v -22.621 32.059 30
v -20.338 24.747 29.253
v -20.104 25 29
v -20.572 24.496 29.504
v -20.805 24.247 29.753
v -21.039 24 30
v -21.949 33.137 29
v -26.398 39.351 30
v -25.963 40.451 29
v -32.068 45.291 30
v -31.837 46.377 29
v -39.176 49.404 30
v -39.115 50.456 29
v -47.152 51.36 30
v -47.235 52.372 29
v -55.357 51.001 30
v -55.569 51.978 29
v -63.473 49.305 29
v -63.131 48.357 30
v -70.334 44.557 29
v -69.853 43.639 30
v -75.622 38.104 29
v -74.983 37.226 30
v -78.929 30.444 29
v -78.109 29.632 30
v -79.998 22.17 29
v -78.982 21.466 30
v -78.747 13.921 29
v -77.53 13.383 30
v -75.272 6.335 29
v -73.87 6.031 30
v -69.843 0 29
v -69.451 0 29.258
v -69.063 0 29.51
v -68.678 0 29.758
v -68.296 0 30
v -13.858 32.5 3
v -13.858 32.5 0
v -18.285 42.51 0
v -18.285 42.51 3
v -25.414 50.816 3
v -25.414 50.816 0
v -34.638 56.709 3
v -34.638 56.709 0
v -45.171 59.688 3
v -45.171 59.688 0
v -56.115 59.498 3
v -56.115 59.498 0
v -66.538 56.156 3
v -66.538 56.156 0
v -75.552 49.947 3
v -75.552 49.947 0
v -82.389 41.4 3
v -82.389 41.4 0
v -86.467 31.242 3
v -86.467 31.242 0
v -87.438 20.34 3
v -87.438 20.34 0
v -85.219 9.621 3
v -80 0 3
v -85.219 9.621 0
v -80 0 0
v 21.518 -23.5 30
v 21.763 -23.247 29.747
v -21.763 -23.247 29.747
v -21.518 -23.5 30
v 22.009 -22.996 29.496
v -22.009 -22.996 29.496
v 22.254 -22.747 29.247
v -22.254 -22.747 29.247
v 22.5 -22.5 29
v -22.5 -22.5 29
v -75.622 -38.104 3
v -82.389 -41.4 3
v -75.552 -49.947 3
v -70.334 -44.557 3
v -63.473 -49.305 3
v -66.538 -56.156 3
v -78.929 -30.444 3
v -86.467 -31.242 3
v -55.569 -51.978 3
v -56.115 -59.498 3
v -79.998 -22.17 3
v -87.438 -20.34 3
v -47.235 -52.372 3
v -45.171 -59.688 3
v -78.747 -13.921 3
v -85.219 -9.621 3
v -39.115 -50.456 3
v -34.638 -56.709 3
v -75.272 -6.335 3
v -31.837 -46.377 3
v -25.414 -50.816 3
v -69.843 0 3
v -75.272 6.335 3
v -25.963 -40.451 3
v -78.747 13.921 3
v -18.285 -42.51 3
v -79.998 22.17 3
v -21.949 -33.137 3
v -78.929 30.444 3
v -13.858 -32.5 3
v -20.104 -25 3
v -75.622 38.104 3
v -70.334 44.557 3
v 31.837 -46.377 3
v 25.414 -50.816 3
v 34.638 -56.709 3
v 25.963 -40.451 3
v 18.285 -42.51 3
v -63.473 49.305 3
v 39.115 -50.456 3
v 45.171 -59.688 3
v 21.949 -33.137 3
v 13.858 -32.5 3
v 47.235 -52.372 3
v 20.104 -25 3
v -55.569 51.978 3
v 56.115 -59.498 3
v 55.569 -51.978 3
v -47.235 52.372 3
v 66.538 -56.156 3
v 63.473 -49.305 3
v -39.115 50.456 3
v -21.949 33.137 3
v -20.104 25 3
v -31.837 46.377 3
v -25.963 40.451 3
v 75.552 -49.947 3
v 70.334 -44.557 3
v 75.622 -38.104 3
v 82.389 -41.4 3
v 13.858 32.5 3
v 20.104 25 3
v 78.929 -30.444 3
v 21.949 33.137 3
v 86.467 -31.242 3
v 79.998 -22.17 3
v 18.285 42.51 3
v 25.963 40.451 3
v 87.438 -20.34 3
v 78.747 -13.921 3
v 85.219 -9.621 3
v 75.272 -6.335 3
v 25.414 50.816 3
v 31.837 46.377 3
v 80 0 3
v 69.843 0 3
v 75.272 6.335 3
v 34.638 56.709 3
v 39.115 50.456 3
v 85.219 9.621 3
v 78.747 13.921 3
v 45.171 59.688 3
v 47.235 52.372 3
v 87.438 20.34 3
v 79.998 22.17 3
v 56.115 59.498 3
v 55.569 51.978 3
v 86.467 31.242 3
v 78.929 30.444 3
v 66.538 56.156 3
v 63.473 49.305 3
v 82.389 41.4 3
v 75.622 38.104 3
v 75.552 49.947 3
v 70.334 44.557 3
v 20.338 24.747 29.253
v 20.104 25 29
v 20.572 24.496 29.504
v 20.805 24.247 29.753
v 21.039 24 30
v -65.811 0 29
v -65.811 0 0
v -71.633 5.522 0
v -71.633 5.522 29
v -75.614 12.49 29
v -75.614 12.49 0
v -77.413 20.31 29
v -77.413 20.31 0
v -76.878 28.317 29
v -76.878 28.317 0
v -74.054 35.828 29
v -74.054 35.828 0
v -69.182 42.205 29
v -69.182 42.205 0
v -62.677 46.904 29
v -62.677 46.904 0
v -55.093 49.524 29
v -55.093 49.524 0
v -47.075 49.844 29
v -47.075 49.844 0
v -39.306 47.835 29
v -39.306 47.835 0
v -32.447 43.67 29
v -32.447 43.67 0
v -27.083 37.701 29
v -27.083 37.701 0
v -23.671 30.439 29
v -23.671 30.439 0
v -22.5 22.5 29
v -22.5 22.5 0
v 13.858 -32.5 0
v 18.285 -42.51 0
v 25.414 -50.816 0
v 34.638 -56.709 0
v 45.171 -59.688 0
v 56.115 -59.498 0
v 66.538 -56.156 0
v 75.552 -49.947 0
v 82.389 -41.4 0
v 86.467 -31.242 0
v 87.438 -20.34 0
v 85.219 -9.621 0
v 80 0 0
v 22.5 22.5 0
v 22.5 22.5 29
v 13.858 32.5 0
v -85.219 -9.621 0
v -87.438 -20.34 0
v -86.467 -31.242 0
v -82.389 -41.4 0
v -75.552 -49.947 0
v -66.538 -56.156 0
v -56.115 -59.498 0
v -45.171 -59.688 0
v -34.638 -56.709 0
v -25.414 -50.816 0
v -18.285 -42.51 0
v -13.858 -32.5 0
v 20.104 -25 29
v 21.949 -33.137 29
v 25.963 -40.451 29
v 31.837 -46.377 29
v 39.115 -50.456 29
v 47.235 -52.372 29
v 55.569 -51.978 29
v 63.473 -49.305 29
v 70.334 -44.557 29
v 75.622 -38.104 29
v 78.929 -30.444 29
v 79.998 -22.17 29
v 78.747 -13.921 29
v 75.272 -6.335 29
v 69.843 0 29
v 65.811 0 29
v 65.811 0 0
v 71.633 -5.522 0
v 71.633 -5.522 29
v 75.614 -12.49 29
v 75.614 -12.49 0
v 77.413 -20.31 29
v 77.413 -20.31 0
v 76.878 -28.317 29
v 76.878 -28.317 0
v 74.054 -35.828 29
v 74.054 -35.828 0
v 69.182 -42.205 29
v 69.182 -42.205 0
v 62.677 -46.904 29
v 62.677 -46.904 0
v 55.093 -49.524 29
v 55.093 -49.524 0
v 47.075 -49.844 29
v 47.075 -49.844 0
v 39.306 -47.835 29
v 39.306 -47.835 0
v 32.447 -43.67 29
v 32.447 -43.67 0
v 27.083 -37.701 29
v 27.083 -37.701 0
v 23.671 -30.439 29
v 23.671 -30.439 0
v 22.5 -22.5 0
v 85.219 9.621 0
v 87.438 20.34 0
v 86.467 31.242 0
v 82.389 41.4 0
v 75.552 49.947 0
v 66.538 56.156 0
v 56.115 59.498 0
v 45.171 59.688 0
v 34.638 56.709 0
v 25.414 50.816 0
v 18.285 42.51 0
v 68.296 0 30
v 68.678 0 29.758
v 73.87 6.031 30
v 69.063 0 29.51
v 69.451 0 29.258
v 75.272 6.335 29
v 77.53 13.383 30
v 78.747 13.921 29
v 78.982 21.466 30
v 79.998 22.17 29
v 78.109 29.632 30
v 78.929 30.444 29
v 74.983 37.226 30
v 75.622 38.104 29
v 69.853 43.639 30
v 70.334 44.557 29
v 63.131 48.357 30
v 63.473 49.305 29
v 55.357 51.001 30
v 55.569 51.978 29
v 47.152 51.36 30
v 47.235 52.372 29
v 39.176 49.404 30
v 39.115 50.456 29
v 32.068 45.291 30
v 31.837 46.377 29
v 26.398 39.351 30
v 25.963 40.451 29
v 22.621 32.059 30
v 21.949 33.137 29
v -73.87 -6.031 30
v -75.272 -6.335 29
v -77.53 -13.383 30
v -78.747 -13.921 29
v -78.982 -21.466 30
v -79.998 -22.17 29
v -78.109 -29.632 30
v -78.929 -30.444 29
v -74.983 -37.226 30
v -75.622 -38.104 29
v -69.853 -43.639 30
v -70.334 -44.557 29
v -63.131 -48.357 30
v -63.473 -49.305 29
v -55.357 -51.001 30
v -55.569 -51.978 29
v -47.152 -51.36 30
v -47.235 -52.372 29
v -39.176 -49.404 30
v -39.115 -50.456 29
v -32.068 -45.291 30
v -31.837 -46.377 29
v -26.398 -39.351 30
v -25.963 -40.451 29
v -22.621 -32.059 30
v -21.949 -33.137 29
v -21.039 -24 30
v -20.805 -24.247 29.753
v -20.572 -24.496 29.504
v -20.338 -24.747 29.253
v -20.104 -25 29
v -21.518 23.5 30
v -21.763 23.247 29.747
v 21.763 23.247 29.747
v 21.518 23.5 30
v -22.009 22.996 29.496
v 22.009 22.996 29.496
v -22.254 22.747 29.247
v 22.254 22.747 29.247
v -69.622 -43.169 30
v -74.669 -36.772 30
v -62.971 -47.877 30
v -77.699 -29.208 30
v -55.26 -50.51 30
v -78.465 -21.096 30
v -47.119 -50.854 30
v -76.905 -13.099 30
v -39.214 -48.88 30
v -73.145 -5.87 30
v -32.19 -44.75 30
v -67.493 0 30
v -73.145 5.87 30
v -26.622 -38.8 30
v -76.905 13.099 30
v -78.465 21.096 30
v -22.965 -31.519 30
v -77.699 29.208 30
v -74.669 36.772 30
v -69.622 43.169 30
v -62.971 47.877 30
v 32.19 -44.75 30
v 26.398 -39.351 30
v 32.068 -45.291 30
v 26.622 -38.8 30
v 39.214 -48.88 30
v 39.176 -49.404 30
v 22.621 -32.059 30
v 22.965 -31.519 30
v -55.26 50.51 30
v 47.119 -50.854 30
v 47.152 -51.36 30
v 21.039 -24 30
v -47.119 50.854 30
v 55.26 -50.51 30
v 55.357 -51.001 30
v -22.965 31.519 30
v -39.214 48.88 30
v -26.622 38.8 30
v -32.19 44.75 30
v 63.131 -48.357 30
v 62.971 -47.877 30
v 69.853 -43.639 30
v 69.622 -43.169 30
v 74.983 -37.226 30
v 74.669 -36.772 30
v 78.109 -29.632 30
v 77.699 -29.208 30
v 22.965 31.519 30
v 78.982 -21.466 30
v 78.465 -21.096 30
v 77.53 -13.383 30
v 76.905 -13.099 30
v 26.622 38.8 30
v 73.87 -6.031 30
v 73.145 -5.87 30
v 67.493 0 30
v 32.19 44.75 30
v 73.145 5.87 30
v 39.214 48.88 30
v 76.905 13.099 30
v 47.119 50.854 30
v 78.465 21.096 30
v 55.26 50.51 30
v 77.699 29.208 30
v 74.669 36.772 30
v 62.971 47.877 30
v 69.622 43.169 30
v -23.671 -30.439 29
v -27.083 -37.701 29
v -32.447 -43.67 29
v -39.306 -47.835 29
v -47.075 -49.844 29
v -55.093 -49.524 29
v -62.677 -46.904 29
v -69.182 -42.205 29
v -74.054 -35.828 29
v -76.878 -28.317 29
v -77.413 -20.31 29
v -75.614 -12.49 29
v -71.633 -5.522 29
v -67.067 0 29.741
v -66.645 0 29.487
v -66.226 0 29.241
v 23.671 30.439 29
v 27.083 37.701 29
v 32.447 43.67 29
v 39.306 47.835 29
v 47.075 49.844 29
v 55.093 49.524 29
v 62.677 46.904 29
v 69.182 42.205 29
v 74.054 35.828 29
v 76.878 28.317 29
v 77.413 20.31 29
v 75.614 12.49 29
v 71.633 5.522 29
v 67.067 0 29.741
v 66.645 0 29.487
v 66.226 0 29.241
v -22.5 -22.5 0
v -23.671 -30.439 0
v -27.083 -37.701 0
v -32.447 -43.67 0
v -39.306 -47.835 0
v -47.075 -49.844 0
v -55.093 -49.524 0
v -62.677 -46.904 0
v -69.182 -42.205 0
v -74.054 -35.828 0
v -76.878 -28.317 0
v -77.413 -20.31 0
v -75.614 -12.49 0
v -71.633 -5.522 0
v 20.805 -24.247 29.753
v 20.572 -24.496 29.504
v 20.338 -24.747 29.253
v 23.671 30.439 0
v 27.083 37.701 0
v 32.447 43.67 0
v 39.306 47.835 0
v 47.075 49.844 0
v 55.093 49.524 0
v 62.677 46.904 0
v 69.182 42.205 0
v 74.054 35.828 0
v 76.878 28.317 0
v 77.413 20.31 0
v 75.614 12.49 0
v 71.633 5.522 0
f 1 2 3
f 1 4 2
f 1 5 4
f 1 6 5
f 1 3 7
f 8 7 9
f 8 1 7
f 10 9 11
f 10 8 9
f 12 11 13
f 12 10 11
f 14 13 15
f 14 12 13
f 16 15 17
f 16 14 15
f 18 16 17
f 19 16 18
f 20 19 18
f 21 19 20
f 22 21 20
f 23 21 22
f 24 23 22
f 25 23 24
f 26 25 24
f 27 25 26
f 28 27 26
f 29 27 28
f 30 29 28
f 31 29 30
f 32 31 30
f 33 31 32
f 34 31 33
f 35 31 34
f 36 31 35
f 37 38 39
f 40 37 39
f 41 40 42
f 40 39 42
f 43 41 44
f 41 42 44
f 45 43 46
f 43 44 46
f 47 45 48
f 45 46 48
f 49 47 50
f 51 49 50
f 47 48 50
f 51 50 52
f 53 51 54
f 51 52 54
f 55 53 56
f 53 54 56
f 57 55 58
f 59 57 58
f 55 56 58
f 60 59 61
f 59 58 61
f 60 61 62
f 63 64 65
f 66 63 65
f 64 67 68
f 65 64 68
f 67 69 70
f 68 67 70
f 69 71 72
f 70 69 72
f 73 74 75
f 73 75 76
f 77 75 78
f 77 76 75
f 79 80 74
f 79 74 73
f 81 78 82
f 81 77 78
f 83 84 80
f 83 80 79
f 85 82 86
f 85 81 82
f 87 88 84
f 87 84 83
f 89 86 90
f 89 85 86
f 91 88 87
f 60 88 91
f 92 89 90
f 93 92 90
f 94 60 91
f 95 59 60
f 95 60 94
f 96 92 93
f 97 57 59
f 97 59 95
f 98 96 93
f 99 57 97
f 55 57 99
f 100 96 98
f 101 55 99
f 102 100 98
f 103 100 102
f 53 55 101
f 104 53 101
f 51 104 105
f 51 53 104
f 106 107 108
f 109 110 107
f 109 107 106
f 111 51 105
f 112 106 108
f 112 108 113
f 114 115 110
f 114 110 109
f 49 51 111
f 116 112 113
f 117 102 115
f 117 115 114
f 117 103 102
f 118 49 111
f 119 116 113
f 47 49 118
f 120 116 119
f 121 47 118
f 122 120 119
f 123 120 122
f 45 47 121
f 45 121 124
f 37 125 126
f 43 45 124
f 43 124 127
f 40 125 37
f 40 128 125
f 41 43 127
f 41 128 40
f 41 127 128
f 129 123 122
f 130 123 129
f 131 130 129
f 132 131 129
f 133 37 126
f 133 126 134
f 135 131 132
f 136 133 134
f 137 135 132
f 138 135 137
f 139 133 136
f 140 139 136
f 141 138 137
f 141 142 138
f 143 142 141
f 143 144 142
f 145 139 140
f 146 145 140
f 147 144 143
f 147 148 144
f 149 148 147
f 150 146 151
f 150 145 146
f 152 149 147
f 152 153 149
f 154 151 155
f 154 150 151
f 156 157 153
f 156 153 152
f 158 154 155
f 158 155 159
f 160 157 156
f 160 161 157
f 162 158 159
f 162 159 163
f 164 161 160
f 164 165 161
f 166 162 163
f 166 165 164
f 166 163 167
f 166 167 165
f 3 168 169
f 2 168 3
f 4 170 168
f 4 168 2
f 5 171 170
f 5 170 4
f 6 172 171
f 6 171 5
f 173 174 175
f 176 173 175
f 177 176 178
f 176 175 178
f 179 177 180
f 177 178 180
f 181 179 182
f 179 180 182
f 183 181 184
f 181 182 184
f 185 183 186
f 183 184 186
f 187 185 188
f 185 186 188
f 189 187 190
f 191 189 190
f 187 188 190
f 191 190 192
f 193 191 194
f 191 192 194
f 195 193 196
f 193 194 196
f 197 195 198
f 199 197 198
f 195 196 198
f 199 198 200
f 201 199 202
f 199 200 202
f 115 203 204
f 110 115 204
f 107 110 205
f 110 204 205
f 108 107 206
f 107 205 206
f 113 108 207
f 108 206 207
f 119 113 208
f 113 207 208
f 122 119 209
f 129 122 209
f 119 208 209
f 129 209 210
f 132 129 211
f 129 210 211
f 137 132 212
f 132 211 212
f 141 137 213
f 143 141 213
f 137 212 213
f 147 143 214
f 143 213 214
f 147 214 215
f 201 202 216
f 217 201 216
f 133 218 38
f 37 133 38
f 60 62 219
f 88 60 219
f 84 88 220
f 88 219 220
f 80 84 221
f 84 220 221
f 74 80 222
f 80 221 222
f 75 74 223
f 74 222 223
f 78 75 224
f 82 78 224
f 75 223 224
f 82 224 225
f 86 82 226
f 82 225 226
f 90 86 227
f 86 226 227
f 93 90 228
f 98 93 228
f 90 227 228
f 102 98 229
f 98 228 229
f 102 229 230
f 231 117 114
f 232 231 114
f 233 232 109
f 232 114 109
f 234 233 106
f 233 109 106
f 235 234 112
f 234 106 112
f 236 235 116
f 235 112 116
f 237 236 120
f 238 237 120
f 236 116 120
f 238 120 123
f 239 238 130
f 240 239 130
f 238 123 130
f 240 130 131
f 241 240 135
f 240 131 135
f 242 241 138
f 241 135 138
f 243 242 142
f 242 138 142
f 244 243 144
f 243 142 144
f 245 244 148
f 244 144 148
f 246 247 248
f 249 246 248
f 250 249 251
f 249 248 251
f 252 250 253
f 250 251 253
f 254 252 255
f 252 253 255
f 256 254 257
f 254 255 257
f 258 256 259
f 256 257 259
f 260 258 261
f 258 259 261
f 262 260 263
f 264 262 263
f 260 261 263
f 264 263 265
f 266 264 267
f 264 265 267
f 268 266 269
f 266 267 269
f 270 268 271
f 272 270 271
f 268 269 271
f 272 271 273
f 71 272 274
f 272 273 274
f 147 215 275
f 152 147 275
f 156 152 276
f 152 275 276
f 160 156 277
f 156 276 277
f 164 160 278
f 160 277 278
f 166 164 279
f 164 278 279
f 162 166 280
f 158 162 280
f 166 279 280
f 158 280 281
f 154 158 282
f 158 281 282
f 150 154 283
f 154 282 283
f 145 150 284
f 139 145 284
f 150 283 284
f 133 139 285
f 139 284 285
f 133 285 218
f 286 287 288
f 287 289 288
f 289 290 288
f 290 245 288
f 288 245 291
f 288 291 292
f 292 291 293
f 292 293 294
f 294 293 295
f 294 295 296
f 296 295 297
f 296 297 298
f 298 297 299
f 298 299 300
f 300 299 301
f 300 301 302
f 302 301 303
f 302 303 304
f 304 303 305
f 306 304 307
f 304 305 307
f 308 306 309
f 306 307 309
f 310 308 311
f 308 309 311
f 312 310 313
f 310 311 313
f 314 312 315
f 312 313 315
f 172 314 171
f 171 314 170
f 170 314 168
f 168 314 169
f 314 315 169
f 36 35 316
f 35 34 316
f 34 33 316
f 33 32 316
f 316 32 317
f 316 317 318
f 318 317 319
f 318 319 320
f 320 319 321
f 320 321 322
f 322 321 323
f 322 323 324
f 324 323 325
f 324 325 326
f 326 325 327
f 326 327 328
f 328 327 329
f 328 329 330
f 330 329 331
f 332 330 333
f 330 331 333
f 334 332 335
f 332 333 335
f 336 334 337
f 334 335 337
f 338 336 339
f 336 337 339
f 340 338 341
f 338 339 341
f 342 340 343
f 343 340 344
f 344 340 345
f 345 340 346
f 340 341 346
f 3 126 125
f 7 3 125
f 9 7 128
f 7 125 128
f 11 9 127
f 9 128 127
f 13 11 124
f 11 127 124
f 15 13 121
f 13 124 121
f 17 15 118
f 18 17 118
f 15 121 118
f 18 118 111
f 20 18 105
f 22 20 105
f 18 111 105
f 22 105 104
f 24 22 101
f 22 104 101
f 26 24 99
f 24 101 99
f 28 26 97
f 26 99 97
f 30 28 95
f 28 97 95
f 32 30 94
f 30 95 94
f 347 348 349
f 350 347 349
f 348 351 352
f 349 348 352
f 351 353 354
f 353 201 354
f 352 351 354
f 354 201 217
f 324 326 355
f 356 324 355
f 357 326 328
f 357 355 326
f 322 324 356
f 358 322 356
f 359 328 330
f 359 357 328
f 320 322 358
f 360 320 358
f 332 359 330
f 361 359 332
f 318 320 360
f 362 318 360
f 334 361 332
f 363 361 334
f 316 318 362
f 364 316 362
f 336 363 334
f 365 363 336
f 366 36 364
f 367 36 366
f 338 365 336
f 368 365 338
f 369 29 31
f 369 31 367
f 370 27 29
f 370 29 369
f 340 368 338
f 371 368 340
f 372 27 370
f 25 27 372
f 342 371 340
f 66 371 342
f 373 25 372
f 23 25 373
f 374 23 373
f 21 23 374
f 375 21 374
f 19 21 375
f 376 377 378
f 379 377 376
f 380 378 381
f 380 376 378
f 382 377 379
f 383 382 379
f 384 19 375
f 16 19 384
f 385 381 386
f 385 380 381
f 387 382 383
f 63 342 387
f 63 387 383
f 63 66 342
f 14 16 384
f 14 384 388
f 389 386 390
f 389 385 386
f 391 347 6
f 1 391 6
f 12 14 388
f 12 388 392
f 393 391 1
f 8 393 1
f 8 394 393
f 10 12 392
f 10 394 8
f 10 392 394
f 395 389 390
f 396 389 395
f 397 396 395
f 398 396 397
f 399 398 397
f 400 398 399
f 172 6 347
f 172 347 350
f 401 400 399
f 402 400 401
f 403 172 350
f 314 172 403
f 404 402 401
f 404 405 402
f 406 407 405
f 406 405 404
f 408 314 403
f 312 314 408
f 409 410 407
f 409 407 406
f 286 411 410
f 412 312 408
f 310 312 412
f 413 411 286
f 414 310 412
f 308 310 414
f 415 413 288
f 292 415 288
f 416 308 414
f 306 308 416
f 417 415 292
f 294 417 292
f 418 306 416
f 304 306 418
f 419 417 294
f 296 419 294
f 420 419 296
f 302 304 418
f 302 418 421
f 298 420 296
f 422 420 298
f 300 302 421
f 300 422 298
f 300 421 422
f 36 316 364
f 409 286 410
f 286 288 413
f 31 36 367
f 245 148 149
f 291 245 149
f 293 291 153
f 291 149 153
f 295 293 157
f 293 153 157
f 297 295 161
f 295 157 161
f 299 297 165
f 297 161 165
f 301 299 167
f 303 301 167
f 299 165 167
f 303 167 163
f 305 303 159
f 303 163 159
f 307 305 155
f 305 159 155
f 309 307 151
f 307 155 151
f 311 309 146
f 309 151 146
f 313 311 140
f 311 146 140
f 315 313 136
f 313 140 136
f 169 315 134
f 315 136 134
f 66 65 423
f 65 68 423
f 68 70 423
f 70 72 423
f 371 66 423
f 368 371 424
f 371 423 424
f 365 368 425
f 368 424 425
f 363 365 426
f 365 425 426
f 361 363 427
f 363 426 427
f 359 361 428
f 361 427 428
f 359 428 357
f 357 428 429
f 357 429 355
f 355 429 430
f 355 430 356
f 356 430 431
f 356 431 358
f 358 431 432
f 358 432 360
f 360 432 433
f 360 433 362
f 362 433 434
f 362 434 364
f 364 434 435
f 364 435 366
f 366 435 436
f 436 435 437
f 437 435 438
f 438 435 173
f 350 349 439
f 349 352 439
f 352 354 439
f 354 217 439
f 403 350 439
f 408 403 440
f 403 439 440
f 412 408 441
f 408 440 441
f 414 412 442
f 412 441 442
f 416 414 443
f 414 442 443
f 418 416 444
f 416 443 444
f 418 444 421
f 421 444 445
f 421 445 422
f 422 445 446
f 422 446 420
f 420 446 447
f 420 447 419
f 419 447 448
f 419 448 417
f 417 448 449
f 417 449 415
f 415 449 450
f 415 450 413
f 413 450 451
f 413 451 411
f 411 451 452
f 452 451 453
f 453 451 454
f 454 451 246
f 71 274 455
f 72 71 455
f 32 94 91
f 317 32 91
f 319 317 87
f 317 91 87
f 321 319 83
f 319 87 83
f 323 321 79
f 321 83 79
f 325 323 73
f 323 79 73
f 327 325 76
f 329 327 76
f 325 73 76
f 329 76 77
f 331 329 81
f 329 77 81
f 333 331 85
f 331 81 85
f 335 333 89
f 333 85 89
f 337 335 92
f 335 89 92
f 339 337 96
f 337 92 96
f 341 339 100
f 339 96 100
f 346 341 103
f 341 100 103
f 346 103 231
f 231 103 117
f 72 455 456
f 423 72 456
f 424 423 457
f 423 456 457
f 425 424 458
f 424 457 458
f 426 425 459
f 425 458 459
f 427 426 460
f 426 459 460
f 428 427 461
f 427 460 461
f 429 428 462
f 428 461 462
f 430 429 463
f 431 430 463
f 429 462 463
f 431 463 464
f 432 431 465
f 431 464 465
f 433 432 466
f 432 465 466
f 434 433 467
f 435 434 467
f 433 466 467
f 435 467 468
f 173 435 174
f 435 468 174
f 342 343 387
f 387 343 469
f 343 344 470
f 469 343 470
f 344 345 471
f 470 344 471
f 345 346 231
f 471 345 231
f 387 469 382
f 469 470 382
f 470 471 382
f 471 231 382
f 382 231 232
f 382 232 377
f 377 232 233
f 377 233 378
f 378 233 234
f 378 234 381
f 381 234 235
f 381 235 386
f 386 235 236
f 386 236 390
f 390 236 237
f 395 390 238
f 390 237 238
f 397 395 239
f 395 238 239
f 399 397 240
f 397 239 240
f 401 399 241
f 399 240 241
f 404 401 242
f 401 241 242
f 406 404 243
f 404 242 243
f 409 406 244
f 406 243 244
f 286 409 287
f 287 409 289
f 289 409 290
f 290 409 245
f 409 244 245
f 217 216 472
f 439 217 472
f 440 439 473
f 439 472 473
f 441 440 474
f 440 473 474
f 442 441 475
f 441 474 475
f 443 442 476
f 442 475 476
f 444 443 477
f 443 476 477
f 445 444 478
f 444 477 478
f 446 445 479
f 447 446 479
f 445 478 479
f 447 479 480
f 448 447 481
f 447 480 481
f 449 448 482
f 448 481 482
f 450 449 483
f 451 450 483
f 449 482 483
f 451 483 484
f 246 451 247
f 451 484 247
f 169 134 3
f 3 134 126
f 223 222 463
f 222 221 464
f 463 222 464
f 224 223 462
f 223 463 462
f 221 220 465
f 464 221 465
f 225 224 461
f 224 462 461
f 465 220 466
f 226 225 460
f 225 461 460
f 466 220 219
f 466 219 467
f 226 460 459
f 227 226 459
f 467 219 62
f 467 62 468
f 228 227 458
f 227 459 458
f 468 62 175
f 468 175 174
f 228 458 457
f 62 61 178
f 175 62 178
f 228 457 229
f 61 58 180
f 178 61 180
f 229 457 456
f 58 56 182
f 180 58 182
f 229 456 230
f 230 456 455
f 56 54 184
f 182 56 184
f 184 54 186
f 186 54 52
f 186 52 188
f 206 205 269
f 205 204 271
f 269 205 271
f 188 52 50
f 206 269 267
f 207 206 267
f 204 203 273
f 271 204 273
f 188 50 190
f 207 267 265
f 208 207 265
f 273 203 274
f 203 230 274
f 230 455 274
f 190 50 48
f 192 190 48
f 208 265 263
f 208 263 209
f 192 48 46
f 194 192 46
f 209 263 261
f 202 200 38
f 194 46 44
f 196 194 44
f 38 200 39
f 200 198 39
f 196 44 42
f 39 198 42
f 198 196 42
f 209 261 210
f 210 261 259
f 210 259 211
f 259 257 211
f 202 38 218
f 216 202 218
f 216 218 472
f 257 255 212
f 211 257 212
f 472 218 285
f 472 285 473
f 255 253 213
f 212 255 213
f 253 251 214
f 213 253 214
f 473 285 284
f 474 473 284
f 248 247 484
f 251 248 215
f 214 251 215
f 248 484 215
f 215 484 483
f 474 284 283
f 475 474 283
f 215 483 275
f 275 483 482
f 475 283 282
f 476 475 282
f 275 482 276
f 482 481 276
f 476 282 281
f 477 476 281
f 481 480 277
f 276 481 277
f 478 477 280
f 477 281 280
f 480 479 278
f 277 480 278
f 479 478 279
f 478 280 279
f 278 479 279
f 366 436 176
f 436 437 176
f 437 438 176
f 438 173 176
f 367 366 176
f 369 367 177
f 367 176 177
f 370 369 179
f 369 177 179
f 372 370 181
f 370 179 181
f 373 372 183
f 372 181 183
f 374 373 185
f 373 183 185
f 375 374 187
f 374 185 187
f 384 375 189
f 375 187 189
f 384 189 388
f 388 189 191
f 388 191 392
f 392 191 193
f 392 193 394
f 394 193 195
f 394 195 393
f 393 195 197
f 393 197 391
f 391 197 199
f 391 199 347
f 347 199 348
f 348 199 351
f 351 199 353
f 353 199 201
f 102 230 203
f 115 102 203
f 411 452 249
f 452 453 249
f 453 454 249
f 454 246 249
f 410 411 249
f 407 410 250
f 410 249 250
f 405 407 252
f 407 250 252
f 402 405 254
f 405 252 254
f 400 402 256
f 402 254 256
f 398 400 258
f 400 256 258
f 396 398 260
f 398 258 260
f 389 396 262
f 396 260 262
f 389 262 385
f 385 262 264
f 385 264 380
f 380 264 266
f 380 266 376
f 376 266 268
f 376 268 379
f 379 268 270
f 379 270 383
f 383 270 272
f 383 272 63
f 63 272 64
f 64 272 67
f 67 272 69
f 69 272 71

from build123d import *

# Parameters (mm, degrees)
F1_DEPTH = 3
F2_DEPTH = 30
F3_SIZE  = 1


with BuildPart() as f1:
    # F0 (on Top) → F1 (new body)
    with BuildSketch(Plane.XY):
        with BuildLine():
            Line((13.857919263, 32.5), (-13.857919263, 32.5))
            ThreePointArc((-13.857919263, 32.5), (-66.5376476243, 56.1564438266), (-80, 0))
            ThreePointArc((-80, 0), (-66.5376476243, -56.1564438266), (-13.857919263, -32.5))
            Line((-13.857919263, -32.5), (13.857919263, -32.5))
            ThreePointArc((13.857919263, -32.5), (66.5376476243, -56.1564438266), (80, 0))
            ThreePointArc((80, 0), (66.5376476243, 56.1564438266), (13.857919263, 32.5))
        make_face()
        with BuildLine():
            ThreePointArc((-69.843134833, 0), (-63.4726862442, 49.30460269), (-20.1043481422, 25))
            Line((-20.1043481422, 25), (20.1043481422, 25))
            ThreePointArc((20.1043481422, 25), (63.4726862442, 49.30460269), (69.843134833, 0))
            ThreePointArc((69.843134833, 0), (63.4726862442, -49.30460269), (20.1043481422, -25))
            Line((20.1043481422, -25), (-20.1043481422, -25))
            ThreePointArc((-20.1043481422, -25), (-63.4726862442, -49.30460269), (-69.843134833, 0))
        make_face(mode=Mode.SUBTRACT)
    extrude(amount=F1_DEPTH)

    # F0 (on Top) → F2 (join)
    with BuildSketch(Plane.XY):
        with BuildLine():
            Line((20.1043481422, 25), (-20.1043481422, 25))
            ThreePointArc((-20.1043481422, 25), (-63.4726862442, 49.30460269), (-69.843134833, 0))
            ThreePointArc((-69.843134833, 0), (-63.4726862442, -49.30460269), (-20.1043481422, -25))
            Line((-20.1043481422, -25), (20.1043481422, -25))
            ThreePointArc((20.1043481422, -25), (63.4726862442, -49.30460269), (69.843134833, 0))
            ThreePointArc((69.843134833, 0), (63.4726862442, 49.30460269), (20.1043481422, 25))
        make_face()
        with BuildLine():
            ThreePointArc((-22.5, -22.5), (-62.677476518, -46.9035159175), (-65.8113883008, 0))
            ThreePointArc((-65.8113883008, 0), (-62.677476518, 46.9035159175), (-22.5, 22.5))
            Line((-22.5, 22.5), (22.5, 22.5))
            ThreePointArc((22.5, 22.5), (62.677476518, 46.9035159175), (65.8113883008, 0))
            ThreePointArc((65.8113883008, 0), (62.677476518, -46.9035159175), (22.5, -22.5))
            Line((22.5, -22.5), (-22.5, -22.5))
        make_face(mode=Mode.SUBTRACT)
    extrude(amount=F2_DEPTH)

    # F3
    f3_edges = [f1.edges().sort_by_distance(p)[0] for p in [
        (-63.472686, -49.304603, 30),
        (0, -25, 30),
        (63.472686, -49.304603, 30),
        (63.472686, 49.304603, 30),
        (0, 25, 30),
        (-63.472686, 49.304603, 30),
        (-62.677477, 46.903516, 30),
        (-62.677477, -46.903516, 30),
        (0, -22.5, 30),
        (0, 22.5, 30),
        (62.677477, 46.903516, 30),
        (62.677477, -46.903516, 30),
    ]]
    chamfer(f3_edges, length=F3_SIZE)


solid = f1.part
